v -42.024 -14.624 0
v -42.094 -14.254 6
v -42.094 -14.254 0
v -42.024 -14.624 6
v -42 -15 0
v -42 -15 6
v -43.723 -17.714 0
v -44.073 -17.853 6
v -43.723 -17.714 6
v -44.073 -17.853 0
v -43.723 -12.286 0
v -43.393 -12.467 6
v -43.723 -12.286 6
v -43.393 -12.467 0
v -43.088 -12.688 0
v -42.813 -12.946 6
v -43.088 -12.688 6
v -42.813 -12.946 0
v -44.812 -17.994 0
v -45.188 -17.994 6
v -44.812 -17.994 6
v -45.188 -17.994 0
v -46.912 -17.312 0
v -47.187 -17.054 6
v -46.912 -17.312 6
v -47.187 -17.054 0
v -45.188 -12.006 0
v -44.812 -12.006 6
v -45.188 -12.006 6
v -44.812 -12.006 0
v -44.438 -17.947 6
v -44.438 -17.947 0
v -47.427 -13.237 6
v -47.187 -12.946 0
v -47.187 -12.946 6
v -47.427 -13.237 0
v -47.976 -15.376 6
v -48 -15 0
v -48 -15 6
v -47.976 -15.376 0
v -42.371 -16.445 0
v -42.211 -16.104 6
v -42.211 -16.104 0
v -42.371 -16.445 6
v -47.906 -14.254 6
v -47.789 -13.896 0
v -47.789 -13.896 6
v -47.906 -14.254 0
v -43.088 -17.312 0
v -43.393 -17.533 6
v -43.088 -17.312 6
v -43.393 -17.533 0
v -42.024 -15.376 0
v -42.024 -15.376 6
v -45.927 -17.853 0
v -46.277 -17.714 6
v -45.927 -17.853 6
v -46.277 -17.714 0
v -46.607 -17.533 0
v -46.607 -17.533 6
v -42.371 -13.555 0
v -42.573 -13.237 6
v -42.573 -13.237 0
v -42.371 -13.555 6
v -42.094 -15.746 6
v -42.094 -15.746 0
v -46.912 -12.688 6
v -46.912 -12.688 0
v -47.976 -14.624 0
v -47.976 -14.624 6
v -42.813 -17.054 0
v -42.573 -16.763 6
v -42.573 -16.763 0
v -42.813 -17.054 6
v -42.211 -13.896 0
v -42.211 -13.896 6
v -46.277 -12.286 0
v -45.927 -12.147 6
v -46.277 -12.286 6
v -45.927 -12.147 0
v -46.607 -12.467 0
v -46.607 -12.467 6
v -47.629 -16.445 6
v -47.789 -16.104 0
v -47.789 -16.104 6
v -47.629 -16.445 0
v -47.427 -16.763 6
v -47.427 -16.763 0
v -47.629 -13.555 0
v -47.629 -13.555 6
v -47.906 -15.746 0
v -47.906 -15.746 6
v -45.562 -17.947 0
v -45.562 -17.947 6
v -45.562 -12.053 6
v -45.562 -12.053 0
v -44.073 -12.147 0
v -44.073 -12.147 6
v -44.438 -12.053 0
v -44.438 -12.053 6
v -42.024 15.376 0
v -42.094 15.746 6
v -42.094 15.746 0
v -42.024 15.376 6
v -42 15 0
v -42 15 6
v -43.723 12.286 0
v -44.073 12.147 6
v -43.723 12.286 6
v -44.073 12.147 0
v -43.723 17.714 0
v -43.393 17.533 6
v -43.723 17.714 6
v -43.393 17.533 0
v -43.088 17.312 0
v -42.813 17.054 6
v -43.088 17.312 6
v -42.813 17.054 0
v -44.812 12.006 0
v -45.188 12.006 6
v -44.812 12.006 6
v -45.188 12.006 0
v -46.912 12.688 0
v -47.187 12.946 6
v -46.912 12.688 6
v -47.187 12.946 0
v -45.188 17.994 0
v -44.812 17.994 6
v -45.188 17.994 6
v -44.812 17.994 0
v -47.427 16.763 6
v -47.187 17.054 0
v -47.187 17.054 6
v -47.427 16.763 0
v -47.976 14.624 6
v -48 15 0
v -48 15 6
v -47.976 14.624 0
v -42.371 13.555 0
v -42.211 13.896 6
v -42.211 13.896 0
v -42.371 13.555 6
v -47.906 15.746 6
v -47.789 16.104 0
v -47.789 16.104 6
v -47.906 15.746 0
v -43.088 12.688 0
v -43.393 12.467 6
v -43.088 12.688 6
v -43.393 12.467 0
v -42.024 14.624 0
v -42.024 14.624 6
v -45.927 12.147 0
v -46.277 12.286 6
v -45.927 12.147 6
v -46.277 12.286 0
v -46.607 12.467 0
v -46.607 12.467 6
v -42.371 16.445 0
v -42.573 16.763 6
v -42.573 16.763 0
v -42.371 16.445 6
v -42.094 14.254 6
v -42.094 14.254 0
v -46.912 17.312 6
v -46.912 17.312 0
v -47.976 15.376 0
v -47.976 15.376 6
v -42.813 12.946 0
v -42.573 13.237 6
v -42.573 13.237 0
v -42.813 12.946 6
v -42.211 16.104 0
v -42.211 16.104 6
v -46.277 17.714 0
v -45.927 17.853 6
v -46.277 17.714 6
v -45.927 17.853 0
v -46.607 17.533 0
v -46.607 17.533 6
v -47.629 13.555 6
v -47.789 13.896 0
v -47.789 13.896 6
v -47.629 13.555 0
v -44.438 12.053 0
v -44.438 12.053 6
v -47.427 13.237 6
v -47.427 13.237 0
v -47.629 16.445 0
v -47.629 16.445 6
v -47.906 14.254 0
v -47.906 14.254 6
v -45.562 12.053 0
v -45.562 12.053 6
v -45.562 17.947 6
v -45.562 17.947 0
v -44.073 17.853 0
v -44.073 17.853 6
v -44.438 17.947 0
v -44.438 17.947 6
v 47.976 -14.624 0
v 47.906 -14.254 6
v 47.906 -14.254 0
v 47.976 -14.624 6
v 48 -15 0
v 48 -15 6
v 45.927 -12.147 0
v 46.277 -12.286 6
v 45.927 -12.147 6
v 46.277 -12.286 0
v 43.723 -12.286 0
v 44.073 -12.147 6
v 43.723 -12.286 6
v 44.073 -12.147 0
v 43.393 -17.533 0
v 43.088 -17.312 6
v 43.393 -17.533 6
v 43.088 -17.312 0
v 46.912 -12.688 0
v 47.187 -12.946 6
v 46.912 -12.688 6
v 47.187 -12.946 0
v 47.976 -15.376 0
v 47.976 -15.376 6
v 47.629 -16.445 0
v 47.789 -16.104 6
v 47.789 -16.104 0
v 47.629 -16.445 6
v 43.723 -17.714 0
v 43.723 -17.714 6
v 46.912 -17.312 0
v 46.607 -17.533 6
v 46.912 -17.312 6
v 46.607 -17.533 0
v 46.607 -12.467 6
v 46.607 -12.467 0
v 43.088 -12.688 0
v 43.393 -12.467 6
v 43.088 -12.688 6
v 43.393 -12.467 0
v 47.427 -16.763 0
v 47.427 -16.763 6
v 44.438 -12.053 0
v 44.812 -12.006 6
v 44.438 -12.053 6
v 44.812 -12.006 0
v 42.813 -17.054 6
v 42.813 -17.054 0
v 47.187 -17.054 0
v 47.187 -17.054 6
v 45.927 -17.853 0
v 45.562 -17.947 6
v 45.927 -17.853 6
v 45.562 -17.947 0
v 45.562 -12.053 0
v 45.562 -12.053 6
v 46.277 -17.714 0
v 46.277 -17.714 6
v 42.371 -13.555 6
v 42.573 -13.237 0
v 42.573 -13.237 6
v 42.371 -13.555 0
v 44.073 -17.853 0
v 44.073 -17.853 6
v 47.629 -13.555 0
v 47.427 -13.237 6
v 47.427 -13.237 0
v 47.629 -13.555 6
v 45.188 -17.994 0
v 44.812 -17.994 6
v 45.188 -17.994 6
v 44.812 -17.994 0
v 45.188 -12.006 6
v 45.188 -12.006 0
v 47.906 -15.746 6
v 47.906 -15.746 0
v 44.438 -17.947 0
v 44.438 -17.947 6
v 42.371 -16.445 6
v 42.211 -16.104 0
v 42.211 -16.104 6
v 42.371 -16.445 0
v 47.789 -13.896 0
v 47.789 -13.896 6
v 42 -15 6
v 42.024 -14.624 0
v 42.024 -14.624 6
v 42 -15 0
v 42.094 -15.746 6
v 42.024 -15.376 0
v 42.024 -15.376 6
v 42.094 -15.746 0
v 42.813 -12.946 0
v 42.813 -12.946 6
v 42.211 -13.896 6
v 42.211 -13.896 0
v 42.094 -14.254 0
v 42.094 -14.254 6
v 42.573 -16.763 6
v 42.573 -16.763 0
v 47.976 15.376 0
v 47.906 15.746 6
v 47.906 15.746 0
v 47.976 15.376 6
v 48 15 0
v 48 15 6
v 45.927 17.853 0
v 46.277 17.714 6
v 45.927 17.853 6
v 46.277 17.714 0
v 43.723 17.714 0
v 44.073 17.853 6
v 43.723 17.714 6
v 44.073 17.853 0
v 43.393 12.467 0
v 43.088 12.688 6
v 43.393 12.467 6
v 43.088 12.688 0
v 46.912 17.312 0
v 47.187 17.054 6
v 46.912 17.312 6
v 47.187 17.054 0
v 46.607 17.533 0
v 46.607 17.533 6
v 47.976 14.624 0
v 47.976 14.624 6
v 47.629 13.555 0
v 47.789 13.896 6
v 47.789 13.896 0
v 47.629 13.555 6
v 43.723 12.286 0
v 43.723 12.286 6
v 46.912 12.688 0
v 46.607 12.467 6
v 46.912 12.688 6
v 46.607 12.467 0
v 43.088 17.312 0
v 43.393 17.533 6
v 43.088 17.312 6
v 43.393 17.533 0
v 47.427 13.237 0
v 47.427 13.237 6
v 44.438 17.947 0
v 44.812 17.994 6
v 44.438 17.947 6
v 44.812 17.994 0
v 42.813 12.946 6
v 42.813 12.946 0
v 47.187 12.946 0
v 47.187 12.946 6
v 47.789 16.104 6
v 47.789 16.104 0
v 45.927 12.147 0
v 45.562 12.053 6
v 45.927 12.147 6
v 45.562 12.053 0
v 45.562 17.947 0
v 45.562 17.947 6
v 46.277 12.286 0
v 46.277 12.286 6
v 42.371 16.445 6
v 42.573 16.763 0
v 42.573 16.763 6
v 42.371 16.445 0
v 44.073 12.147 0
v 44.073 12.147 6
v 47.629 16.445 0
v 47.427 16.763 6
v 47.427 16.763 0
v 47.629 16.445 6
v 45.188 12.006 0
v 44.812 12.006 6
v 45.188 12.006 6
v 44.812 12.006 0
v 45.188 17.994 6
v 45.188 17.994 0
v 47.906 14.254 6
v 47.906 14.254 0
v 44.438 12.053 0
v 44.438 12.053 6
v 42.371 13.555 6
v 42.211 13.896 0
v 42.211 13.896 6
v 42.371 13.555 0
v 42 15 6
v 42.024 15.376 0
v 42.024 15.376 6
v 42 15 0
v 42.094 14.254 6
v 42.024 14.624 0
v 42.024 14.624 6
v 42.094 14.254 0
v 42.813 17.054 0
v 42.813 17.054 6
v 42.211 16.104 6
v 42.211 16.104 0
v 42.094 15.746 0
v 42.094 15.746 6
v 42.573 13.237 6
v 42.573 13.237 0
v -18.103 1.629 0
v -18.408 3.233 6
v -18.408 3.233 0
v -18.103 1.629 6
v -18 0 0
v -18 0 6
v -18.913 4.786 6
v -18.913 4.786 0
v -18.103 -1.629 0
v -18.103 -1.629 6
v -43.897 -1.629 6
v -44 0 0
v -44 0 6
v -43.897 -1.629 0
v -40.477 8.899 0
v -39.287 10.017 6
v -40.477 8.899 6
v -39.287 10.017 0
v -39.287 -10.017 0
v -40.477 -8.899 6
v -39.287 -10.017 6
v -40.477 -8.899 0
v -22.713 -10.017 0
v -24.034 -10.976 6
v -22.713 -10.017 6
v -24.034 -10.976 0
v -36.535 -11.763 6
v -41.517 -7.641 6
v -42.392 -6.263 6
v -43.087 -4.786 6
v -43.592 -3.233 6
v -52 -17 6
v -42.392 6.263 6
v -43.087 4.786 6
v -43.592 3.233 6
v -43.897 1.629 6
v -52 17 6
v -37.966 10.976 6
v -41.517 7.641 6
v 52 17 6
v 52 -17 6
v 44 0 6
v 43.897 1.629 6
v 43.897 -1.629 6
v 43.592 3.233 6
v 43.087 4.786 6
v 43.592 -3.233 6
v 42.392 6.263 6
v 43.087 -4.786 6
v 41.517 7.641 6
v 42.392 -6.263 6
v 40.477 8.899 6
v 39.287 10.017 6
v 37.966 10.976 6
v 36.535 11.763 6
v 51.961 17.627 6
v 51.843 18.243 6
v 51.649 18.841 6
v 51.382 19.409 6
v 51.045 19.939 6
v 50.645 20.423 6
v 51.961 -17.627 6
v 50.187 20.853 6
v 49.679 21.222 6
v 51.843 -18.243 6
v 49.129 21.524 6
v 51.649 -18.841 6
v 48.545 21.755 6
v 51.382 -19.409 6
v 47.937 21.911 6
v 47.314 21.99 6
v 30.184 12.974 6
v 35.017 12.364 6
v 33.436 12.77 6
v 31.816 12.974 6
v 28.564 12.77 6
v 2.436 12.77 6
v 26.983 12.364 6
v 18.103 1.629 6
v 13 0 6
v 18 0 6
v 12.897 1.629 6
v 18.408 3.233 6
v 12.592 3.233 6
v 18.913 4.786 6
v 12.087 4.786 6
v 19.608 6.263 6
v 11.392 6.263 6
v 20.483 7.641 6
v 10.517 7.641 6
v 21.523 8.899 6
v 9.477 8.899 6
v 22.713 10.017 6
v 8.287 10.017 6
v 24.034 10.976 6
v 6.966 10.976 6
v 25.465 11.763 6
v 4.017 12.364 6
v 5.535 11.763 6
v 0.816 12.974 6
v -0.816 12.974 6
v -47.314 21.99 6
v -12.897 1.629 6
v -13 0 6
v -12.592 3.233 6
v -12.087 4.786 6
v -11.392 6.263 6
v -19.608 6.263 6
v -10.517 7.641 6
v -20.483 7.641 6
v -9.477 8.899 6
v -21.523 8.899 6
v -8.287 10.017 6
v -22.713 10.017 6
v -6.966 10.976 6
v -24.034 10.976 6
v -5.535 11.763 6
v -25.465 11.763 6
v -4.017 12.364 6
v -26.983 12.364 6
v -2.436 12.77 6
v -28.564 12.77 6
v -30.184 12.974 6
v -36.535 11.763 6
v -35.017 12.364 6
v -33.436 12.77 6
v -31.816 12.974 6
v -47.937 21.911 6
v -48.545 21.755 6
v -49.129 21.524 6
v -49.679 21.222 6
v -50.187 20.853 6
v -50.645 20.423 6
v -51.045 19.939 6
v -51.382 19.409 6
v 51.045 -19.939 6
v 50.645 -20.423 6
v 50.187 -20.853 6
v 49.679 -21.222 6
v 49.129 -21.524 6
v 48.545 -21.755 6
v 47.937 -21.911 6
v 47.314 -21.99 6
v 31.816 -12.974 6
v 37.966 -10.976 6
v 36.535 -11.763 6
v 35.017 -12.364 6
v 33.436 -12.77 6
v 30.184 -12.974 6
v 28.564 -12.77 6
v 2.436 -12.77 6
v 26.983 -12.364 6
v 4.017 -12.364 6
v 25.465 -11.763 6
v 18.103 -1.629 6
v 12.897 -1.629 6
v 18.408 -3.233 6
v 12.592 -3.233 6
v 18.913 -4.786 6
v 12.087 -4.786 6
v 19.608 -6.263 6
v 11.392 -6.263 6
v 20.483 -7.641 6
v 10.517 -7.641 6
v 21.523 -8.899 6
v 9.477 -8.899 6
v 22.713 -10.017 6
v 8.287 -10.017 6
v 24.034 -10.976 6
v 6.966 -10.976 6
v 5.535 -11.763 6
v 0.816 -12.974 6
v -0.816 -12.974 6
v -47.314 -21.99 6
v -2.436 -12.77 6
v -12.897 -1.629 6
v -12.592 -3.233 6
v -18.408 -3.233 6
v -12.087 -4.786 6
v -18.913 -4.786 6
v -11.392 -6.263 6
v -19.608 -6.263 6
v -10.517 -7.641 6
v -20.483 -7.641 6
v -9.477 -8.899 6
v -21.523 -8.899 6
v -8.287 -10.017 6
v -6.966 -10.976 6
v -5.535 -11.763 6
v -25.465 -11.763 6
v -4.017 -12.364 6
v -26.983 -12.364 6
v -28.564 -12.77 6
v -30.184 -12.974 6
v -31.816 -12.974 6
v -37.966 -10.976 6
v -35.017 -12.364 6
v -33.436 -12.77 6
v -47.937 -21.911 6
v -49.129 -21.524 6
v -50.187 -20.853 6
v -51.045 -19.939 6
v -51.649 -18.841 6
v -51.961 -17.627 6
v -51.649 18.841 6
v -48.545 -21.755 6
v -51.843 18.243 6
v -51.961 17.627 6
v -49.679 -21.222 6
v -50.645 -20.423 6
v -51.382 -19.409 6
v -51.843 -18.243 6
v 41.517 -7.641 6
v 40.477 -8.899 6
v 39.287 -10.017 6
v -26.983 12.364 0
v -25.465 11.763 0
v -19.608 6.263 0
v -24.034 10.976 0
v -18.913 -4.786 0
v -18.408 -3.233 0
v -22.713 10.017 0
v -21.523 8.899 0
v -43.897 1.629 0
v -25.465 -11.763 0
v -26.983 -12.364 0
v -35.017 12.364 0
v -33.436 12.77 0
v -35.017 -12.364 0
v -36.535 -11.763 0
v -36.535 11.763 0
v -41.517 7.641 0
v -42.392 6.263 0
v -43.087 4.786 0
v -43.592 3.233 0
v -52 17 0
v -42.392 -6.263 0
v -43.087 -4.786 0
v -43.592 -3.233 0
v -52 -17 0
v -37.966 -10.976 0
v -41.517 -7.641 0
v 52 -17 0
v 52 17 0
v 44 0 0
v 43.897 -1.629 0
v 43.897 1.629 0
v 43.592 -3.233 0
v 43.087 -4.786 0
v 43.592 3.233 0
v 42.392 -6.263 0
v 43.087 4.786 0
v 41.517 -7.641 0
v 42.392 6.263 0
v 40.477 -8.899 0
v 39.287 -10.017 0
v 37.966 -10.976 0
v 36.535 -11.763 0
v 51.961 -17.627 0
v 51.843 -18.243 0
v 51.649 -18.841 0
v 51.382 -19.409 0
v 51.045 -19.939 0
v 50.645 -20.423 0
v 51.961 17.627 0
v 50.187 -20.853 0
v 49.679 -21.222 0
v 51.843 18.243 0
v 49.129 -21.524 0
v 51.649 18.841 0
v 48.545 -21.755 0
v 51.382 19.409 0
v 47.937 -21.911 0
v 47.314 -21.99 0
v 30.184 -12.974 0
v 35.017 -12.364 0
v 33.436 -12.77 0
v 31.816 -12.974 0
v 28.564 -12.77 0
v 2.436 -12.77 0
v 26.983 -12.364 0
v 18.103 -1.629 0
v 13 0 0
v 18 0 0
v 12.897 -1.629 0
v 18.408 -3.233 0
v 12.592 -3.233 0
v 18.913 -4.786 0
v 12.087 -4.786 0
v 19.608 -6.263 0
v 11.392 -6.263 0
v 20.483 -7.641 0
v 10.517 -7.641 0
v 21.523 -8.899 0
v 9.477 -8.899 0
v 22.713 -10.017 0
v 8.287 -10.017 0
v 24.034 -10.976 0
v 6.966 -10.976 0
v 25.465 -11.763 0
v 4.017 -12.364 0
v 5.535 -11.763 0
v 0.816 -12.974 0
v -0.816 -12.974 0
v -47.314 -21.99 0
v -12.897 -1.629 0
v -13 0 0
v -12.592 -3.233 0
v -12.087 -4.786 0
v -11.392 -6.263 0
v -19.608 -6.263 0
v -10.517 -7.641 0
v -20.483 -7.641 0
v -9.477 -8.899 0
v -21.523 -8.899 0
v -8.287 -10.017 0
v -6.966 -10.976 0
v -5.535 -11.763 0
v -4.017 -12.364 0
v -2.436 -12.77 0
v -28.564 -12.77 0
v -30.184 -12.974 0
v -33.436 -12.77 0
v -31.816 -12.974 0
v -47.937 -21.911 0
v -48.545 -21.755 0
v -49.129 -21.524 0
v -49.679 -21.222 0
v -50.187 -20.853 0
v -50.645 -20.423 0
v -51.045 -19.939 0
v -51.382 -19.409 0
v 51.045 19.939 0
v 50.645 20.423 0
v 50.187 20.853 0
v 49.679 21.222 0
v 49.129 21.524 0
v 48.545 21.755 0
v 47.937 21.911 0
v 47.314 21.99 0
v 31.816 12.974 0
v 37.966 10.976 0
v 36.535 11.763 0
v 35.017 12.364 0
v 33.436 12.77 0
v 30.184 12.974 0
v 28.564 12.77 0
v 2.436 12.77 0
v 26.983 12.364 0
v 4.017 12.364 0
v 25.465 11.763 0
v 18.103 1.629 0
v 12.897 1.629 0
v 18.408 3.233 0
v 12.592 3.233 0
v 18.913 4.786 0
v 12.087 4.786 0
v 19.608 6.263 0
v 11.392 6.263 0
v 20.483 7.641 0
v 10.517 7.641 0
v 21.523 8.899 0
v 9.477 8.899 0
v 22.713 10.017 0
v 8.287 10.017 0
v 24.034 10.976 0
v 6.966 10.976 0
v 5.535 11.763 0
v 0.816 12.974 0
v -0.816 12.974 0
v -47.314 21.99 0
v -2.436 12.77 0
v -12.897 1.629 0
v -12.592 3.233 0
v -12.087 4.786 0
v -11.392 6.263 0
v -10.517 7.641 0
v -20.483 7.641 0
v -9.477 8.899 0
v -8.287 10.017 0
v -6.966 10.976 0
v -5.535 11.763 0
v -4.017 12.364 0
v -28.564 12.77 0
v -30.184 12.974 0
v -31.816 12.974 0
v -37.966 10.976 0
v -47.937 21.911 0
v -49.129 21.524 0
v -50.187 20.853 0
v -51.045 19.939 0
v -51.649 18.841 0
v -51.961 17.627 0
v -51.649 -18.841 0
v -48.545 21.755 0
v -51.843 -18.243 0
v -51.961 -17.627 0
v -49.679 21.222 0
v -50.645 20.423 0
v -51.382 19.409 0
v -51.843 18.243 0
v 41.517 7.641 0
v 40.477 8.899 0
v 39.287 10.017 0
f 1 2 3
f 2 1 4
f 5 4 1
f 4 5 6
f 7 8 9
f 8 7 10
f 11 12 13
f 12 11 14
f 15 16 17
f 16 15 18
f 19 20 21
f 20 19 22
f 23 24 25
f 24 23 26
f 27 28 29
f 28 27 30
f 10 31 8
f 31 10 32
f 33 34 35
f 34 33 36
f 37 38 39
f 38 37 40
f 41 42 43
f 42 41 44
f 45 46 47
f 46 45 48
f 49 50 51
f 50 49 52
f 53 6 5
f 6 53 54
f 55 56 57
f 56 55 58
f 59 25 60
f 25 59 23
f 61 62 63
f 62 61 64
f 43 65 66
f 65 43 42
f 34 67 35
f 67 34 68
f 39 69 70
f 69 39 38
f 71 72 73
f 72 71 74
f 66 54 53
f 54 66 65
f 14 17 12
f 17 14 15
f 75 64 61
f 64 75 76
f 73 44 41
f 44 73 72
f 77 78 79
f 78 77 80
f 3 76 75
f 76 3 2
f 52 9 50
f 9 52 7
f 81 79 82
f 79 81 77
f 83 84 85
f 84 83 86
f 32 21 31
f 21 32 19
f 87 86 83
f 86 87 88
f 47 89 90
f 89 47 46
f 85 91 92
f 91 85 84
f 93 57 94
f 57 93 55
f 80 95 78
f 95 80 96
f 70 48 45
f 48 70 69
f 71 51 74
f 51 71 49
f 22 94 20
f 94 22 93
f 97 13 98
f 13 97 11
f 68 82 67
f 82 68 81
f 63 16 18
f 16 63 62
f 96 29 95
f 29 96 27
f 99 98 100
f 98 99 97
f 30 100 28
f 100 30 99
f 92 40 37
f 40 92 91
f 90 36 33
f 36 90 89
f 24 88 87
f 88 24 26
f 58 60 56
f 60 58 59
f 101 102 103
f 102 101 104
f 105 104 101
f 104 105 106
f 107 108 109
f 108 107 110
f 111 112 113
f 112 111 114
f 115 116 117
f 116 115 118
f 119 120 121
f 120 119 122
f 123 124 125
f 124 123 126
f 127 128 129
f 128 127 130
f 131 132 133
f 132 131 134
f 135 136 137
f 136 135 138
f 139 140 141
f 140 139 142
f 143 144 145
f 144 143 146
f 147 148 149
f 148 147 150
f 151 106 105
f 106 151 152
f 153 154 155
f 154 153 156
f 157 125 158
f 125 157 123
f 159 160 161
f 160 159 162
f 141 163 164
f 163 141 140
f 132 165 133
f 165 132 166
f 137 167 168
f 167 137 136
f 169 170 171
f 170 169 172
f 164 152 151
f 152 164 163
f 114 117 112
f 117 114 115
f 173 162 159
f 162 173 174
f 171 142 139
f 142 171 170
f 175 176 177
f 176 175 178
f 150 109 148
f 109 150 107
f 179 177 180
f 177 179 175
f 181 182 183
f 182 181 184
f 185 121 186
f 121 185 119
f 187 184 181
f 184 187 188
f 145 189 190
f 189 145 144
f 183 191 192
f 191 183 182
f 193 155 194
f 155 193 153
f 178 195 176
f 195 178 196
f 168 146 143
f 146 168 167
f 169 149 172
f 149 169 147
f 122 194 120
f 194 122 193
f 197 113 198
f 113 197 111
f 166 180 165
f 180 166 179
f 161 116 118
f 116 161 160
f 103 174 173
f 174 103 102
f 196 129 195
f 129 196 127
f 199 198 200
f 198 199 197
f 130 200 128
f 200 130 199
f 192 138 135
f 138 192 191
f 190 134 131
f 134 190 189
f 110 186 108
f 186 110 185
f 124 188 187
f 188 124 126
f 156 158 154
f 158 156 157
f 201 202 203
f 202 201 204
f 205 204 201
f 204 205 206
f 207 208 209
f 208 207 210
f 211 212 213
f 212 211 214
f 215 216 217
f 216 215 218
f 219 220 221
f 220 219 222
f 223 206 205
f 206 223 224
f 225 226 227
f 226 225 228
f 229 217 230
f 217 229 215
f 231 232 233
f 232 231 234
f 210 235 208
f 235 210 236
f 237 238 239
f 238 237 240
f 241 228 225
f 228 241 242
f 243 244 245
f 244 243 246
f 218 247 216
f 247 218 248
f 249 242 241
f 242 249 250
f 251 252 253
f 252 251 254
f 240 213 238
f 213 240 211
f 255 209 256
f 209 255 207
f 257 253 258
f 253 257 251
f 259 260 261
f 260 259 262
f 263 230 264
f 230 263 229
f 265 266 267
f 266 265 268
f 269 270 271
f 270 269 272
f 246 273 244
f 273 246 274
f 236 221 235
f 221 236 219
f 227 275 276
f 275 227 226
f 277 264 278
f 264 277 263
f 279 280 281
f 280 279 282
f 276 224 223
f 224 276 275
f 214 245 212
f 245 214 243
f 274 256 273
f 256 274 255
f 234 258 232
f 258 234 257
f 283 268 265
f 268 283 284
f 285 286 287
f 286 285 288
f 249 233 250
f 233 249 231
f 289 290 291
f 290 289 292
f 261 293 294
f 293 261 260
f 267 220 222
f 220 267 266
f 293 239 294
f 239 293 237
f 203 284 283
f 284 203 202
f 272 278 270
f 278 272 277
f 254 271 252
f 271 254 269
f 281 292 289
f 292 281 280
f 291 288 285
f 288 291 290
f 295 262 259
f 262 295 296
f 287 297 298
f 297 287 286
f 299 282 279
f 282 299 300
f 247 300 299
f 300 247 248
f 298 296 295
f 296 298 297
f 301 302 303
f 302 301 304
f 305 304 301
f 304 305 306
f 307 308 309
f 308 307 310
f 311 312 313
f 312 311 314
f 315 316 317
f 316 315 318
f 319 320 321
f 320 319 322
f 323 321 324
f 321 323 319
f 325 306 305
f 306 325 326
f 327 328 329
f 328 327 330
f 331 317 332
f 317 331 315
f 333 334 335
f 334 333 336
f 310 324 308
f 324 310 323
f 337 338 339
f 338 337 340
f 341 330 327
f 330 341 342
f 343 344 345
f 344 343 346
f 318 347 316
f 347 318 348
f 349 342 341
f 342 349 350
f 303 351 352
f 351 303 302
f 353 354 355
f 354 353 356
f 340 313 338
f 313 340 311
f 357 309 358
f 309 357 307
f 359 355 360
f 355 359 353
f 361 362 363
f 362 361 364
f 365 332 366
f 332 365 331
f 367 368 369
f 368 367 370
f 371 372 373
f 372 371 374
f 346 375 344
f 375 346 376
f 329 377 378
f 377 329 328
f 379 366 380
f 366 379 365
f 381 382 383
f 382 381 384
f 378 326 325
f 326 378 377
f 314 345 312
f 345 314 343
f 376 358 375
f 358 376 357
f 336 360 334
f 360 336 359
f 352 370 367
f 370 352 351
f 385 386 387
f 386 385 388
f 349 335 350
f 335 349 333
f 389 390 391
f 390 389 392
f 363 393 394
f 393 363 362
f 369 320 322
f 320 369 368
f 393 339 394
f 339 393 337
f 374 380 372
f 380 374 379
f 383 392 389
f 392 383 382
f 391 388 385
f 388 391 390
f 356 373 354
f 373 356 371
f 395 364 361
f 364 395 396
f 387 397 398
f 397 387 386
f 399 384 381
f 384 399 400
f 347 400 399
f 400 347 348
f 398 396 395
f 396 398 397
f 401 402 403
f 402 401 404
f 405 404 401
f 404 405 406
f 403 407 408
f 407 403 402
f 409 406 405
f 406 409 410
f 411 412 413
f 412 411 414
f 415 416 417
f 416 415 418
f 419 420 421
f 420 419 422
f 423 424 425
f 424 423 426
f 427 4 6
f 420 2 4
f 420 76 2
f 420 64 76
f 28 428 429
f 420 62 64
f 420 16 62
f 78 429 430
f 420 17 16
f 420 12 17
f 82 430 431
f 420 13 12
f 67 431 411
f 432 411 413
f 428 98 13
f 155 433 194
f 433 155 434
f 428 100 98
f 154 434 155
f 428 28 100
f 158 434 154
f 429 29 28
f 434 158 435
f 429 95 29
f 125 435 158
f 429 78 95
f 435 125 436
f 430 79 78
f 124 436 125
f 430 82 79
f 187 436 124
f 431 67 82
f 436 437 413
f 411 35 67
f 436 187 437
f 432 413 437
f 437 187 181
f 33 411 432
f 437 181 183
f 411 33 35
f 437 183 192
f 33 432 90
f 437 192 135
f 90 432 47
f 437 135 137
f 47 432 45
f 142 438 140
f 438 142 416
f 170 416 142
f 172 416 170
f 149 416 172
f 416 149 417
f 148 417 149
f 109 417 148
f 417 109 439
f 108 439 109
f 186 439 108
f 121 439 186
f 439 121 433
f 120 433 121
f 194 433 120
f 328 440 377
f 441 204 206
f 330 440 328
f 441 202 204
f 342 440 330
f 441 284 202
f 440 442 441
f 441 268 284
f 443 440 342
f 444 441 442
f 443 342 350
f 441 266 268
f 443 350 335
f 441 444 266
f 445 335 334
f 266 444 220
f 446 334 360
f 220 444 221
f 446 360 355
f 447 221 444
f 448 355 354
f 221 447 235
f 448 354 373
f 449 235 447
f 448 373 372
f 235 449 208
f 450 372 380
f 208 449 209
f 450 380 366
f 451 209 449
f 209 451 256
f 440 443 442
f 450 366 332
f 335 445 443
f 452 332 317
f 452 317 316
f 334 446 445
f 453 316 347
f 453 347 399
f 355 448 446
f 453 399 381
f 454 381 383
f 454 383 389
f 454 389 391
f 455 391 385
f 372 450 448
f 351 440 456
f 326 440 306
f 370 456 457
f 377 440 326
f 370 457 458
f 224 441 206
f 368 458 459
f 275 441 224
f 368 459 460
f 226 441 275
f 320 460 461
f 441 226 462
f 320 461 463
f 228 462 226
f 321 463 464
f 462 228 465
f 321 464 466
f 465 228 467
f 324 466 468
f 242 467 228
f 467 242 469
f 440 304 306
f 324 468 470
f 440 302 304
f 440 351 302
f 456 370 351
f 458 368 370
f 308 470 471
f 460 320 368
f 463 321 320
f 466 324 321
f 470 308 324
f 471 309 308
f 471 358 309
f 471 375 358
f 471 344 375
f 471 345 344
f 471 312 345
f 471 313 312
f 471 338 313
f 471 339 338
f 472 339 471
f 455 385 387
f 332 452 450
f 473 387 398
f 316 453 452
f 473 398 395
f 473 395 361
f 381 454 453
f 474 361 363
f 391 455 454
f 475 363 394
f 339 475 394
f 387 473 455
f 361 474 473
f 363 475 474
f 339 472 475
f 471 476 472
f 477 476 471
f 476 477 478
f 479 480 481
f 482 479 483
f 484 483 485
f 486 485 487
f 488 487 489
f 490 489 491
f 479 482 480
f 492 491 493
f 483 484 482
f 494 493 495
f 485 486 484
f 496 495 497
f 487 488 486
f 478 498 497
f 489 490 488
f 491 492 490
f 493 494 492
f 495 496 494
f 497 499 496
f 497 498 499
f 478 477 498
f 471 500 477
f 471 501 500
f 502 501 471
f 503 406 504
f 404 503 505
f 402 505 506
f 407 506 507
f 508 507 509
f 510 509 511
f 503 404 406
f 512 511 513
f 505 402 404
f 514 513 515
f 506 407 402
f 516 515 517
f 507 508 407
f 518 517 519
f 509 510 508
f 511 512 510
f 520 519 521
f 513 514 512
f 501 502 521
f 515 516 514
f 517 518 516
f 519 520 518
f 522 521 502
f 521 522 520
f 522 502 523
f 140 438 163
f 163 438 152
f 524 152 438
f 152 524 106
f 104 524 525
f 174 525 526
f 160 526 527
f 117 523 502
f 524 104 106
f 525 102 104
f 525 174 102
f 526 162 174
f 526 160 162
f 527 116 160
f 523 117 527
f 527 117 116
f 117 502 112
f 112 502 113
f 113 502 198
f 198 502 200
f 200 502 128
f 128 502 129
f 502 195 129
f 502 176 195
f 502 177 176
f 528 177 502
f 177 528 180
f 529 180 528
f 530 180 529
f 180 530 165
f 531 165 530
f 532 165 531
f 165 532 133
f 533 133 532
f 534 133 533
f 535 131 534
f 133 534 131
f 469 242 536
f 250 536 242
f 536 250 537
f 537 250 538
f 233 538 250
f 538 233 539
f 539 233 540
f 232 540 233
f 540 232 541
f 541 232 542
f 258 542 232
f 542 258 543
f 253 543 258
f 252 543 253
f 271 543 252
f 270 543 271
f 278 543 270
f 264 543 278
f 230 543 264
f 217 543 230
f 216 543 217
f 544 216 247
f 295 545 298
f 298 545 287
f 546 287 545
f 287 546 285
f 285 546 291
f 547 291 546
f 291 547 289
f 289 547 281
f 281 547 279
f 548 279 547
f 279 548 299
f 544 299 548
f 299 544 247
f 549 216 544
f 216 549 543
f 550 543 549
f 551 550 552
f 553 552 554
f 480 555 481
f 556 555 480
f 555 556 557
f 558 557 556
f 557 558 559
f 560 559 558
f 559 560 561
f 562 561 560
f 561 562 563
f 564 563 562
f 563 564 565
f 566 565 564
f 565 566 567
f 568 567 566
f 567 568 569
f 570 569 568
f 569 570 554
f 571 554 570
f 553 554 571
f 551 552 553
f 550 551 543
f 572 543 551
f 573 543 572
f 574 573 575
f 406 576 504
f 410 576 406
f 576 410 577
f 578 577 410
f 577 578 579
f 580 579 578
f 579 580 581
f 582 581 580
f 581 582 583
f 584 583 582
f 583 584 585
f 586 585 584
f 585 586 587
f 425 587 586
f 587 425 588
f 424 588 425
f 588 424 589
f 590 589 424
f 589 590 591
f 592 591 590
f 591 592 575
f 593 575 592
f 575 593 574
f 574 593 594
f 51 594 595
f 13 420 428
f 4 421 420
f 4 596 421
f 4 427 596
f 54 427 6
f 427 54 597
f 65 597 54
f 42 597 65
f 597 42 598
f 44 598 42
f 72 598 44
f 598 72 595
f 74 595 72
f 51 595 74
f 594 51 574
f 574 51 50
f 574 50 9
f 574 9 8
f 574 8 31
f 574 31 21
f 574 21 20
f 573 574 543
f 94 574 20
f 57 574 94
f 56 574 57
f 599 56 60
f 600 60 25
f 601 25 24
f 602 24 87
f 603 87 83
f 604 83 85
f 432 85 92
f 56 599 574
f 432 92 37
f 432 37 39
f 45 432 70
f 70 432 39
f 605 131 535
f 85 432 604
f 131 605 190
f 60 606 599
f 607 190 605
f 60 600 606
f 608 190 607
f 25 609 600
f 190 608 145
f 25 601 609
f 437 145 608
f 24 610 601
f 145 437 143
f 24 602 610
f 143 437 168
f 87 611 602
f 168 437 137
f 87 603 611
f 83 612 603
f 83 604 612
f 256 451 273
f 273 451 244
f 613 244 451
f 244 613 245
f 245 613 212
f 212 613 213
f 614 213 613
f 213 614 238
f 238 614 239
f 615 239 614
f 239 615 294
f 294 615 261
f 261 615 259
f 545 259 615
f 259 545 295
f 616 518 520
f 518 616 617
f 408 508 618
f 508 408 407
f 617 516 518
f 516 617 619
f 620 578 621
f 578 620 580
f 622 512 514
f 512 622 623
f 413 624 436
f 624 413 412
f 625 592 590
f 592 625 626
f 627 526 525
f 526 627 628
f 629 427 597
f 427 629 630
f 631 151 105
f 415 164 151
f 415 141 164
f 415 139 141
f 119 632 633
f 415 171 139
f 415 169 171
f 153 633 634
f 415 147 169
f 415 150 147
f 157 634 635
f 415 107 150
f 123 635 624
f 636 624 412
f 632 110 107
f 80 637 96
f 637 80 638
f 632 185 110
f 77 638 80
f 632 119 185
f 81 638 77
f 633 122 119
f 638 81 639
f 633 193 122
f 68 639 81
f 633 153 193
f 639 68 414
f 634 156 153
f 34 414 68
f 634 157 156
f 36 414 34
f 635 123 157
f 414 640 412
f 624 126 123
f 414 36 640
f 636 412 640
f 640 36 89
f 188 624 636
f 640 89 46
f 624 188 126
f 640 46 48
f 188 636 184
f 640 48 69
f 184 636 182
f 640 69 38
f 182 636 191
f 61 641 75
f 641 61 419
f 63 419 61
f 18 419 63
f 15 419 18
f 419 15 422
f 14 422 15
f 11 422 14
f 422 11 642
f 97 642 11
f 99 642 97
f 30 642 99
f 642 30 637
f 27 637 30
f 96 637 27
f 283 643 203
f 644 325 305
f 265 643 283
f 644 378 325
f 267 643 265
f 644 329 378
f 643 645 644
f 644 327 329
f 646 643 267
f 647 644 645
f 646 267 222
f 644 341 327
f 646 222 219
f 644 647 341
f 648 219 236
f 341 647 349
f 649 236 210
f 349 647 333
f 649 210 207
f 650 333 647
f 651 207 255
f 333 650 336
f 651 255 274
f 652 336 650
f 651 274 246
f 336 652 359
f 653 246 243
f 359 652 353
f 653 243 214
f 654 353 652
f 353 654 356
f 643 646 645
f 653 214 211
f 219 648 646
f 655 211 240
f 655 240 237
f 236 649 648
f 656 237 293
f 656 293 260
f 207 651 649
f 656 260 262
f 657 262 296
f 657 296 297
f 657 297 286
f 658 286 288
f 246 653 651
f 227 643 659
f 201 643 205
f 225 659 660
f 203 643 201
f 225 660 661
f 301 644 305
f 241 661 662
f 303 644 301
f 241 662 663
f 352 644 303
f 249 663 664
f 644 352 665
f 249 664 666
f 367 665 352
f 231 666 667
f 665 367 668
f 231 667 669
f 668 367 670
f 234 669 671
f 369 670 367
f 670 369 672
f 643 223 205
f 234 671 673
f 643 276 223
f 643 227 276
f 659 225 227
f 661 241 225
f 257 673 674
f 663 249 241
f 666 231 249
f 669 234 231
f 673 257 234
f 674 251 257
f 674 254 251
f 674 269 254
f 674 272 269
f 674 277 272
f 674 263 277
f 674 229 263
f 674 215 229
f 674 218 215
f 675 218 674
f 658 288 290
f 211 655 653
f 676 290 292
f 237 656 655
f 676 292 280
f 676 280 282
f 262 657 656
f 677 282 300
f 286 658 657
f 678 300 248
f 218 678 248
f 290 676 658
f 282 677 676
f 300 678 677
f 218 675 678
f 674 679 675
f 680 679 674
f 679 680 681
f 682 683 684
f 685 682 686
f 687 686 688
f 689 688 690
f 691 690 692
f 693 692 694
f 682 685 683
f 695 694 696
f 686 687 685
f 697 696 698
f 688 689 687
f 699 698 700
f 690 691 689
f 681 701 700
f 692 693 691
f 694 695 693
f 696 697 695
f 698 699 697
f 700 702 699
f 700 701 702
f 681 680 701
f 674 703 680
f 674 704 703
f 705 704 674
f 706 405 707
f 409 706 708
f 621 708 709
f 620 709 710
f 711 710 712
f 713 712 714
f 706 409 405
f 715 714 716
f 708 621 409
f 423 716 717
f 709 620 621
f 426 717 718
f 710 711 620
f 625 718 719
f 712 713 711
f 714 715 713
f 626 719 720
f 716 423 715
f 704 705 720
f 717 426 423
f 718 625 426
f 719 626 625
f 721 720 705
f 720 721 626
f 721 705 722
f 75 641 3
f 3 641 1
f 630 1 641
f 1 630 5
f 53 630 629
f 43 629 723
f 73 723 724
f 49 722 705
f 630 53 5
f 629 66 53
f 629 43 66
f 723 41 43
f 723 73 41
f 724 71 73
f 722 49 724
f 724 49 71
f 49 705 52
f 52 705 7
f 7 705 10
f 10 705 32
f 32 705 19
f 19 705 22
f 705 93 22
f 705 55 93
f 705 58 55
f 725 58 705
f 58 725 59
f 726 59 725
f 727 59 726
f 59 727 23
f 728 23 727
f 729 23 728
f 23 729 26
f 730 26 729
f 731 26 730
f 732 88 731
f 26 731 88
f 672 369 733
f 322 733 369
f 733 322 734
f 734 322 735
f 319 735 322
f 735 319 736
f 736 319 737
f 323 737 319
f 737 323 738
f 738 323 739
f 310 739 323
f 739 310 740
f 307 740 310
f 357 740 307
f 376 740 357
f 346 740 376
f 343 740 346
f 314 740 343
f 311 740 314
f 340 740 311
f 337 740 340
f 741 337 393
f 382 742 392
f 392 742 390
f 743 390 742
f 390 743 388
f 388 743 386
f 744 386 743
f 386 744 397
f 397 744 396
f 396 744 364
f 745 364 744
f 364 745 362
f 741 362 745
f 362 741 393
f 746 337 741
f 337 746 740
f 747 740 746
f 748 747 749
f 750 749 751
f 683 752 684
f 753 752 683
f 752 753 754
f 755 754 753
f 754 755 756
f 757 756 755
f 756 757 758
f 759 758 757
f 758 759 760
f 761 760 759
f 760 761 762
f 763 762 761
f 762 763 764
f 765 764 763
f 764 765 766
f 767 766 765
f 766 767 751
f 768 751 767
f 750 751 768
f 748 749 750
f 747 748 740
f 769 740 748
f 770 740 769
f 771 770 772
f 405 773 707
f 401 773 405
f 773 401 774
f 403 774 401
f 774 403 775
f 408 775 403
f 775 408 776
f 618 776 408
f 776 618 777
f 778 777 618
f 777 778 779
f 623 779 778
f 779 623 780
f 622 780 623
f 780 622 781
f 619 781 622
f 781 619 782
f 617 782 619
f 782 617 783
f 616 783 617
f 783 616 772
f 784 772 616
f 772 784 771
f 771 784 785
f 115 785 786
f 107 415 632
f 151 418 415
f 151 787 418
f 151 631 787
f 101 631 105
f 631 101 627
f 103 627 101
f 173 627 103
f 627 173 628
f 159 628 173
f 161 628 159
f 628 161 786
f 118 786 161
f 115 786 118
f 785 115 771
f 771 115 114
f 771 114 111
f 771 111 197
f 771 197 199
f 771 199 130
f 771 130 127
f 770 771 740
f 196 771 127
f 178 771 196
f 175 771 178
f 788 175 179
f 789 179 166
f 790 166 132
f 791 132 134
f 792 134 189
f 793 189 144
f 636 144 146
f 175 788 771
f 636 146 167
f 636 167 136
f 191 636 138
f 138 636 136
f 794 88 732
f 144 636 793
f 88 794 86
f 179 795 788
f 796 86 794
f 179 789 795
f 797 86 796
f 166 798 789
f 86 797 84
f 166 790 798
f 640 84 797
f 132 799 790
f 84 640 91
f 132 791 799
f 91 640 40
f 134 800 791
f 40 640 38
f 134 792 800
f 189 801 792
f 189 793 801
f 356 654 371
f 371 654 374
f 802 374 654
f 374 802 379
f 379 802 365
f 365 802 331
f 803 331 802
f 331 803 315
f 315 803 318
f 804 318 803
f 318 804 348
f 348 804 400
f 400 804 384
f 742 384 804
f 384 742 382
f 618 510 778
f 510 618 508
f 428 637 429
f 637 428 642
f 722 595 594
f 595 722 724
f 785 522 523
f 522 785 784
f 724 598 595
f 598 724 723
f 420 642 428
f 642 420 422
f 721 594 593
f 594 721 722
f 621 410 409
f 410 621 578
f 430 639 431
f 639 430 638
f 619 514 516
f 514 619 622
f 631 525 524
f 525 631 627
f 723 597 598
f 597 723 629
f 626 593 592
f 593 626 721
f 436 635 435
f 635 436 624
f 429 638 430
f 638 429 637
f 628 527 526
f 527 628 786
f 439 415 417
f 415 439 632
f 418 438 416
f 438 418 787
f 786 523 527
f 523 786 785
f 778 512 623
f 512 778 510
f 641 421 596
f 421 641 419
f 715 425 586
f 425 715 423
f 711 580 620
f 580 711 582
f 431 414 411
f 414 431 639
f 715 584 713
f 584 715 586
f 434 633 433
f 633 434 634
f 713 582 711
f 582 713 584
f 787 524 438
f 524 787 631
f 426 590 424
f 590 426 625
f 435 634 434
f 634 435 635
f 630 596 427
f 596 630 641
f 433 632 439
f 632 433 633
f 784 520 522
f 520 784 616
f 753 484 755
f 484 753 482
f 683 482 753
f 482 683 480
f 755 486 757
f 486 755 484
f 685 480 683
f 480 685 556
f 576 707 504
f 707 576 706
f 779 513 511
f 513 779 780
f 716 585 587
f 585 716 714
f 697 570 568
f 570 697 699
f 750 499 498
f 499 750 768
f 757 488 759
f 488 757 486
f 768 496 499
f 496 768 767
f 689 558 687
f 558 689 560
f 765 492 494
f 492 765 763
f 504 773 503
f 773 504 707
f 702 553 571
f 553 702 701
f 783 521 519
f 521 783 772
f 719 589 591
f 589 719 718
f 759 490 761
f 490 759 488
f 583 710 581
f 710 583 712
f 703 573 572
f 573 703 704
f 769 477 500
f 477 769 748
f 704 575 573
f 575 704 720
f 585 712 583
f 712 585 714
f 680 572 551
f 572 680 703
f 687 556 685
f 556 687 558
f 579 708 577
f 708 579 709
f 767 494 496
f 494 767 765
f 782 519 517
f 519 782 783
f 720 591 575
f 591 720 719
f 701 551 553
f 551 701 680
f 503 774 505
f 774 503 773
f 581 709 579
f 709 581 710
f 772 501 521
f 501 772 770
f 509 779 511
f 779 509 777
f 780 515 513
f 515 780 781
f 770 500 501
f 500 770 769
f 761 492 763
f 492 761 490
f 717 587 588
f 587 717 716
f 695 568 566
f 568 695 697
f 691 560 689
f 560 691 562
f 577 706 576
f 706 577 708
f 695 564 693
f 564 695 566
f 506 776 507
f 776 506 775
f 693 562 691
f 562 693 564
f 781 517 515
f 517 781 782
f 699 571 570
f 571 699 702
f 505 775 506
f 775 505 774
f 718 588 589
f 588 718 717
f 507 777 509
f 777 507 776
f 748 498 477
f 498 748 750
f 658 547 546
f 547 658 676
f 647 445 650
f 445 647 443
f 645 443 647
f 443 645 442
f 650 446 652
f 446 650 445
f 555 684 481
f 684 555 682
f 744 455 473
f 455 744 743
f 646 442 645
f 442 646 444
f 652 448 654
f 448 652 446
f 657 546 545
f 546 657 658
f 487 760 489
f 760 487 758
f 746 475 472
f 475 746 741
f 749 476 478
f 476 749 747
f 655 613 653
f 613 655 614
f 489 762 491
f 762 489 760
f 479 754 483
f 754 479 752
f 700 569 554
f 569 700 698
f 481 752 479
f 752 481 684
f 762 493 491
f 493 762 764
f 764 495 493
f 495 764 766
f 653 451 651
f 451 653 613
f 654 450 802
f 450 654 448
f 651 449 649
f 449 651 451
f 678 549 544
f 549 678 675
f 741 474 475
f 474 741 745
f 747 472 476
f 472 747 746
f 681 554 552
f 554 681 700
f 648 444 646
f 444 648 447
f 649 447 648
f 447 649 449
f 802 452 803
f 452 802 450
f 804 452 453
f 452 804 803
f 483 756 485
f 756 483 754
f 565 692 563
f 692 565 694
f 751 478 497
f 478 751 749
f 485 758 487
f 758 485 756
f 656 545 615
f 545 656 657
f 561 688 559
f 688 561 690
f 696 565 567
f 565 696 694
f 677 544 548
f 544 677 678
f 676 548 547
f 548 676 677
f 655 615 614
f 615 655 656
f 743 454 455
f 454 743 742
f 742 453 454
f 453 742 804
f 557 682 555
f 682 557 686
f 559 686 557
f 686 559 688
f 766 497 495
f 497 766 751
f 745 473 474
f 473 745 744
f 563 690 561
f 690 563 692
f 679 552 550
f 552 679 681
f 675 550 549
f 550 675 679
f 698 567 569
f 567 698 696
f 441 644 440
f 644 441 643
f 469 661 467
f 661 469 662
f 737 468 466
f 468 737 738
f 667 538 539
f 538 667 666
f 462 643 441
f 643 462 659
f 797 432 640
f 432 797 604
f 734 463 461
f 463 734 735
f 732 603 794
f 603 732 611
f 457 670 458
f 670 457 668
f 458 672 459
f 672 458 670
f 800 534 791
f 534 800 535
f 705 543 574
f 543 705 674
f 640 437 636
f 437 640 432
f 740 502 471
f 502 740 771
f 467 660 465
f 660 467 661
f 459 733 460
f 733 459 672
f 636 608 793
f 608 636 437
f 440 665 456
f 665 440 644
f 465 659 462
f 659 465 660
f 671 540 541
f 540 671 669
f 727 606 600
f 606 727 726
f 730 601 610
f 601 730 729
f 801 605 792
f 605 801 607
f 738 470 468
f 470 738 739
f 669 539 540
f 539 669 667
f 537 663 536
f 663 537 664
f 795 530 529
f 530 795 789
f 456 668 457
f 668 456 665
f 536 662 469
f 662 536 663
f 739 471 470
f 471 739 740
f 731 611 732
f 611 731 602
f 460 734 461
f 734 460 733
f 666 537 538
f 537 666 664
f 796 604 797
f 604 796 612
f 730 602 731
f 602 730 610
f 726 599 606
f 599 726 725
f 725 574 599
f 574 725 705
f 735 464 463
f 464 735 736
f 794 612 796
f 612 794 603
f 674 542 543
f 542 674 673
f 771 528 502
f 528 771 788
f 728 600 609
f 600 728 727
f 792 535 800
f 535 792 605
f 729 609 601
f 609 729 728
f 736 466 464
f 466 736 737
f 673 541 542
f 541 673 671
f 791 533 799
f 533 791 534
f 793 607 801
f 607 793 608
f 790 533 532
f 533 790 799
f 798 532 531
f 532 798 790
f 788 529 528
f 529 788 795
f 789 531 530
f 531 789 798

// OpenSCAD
$fn = 50;


difference() {
	union() {
		hull() {
			translate(v = [-47.0000000000, 17.0000000000, 0]) {
				cylinder(h = 6, r = 5);
			}
			translate(v = [47.0000000000, 17.0000000000, 0]) {
				cylinder(h = 6, r = 5);
			}
			translate(v = [-47.0000000000, -17.0000000000, 0]) {
				cylinder(h = 6, r = 5);
			}
			translate(v = [47.0000000000, -17.0000000000, 0]) {
				cylinder(h = 6, r = 5);
			}
		}
	}
	union() {
		#translate(v = [-45.0000000000, -15.0000000000, -100.0000000000]) {
			cylinder(h = 200, r = 3.0000000000);
		}
		#translate(v = [-45.0000000000, 15.0000000000, -100.0000000000]) {
			cylinder(h = 200, r = 3.0000000000);
		}
		#translate(v = [45.0000000000, -15.0000000000, -100.0000000000]) {
			cylinder(h = 200, r = 3.0000000000);
		}
		#translate(v = [45.0000000000, 15.0000000000, -100.0000000000]) {
			cylinder(h = 200, r = 3.0000000000);
		}
		#translate(v = [-31.0000000000, 0, 0]) {
			cylinder(h = 6, r = 13.0000000000);
		}
		#cylinder(h = 6, r = 13.0000000000);
		#translate(v = [31.0000000000, 0, 0]) {
			cylinder(h = 6, r = 13.0000000000);
		}
	}
}
